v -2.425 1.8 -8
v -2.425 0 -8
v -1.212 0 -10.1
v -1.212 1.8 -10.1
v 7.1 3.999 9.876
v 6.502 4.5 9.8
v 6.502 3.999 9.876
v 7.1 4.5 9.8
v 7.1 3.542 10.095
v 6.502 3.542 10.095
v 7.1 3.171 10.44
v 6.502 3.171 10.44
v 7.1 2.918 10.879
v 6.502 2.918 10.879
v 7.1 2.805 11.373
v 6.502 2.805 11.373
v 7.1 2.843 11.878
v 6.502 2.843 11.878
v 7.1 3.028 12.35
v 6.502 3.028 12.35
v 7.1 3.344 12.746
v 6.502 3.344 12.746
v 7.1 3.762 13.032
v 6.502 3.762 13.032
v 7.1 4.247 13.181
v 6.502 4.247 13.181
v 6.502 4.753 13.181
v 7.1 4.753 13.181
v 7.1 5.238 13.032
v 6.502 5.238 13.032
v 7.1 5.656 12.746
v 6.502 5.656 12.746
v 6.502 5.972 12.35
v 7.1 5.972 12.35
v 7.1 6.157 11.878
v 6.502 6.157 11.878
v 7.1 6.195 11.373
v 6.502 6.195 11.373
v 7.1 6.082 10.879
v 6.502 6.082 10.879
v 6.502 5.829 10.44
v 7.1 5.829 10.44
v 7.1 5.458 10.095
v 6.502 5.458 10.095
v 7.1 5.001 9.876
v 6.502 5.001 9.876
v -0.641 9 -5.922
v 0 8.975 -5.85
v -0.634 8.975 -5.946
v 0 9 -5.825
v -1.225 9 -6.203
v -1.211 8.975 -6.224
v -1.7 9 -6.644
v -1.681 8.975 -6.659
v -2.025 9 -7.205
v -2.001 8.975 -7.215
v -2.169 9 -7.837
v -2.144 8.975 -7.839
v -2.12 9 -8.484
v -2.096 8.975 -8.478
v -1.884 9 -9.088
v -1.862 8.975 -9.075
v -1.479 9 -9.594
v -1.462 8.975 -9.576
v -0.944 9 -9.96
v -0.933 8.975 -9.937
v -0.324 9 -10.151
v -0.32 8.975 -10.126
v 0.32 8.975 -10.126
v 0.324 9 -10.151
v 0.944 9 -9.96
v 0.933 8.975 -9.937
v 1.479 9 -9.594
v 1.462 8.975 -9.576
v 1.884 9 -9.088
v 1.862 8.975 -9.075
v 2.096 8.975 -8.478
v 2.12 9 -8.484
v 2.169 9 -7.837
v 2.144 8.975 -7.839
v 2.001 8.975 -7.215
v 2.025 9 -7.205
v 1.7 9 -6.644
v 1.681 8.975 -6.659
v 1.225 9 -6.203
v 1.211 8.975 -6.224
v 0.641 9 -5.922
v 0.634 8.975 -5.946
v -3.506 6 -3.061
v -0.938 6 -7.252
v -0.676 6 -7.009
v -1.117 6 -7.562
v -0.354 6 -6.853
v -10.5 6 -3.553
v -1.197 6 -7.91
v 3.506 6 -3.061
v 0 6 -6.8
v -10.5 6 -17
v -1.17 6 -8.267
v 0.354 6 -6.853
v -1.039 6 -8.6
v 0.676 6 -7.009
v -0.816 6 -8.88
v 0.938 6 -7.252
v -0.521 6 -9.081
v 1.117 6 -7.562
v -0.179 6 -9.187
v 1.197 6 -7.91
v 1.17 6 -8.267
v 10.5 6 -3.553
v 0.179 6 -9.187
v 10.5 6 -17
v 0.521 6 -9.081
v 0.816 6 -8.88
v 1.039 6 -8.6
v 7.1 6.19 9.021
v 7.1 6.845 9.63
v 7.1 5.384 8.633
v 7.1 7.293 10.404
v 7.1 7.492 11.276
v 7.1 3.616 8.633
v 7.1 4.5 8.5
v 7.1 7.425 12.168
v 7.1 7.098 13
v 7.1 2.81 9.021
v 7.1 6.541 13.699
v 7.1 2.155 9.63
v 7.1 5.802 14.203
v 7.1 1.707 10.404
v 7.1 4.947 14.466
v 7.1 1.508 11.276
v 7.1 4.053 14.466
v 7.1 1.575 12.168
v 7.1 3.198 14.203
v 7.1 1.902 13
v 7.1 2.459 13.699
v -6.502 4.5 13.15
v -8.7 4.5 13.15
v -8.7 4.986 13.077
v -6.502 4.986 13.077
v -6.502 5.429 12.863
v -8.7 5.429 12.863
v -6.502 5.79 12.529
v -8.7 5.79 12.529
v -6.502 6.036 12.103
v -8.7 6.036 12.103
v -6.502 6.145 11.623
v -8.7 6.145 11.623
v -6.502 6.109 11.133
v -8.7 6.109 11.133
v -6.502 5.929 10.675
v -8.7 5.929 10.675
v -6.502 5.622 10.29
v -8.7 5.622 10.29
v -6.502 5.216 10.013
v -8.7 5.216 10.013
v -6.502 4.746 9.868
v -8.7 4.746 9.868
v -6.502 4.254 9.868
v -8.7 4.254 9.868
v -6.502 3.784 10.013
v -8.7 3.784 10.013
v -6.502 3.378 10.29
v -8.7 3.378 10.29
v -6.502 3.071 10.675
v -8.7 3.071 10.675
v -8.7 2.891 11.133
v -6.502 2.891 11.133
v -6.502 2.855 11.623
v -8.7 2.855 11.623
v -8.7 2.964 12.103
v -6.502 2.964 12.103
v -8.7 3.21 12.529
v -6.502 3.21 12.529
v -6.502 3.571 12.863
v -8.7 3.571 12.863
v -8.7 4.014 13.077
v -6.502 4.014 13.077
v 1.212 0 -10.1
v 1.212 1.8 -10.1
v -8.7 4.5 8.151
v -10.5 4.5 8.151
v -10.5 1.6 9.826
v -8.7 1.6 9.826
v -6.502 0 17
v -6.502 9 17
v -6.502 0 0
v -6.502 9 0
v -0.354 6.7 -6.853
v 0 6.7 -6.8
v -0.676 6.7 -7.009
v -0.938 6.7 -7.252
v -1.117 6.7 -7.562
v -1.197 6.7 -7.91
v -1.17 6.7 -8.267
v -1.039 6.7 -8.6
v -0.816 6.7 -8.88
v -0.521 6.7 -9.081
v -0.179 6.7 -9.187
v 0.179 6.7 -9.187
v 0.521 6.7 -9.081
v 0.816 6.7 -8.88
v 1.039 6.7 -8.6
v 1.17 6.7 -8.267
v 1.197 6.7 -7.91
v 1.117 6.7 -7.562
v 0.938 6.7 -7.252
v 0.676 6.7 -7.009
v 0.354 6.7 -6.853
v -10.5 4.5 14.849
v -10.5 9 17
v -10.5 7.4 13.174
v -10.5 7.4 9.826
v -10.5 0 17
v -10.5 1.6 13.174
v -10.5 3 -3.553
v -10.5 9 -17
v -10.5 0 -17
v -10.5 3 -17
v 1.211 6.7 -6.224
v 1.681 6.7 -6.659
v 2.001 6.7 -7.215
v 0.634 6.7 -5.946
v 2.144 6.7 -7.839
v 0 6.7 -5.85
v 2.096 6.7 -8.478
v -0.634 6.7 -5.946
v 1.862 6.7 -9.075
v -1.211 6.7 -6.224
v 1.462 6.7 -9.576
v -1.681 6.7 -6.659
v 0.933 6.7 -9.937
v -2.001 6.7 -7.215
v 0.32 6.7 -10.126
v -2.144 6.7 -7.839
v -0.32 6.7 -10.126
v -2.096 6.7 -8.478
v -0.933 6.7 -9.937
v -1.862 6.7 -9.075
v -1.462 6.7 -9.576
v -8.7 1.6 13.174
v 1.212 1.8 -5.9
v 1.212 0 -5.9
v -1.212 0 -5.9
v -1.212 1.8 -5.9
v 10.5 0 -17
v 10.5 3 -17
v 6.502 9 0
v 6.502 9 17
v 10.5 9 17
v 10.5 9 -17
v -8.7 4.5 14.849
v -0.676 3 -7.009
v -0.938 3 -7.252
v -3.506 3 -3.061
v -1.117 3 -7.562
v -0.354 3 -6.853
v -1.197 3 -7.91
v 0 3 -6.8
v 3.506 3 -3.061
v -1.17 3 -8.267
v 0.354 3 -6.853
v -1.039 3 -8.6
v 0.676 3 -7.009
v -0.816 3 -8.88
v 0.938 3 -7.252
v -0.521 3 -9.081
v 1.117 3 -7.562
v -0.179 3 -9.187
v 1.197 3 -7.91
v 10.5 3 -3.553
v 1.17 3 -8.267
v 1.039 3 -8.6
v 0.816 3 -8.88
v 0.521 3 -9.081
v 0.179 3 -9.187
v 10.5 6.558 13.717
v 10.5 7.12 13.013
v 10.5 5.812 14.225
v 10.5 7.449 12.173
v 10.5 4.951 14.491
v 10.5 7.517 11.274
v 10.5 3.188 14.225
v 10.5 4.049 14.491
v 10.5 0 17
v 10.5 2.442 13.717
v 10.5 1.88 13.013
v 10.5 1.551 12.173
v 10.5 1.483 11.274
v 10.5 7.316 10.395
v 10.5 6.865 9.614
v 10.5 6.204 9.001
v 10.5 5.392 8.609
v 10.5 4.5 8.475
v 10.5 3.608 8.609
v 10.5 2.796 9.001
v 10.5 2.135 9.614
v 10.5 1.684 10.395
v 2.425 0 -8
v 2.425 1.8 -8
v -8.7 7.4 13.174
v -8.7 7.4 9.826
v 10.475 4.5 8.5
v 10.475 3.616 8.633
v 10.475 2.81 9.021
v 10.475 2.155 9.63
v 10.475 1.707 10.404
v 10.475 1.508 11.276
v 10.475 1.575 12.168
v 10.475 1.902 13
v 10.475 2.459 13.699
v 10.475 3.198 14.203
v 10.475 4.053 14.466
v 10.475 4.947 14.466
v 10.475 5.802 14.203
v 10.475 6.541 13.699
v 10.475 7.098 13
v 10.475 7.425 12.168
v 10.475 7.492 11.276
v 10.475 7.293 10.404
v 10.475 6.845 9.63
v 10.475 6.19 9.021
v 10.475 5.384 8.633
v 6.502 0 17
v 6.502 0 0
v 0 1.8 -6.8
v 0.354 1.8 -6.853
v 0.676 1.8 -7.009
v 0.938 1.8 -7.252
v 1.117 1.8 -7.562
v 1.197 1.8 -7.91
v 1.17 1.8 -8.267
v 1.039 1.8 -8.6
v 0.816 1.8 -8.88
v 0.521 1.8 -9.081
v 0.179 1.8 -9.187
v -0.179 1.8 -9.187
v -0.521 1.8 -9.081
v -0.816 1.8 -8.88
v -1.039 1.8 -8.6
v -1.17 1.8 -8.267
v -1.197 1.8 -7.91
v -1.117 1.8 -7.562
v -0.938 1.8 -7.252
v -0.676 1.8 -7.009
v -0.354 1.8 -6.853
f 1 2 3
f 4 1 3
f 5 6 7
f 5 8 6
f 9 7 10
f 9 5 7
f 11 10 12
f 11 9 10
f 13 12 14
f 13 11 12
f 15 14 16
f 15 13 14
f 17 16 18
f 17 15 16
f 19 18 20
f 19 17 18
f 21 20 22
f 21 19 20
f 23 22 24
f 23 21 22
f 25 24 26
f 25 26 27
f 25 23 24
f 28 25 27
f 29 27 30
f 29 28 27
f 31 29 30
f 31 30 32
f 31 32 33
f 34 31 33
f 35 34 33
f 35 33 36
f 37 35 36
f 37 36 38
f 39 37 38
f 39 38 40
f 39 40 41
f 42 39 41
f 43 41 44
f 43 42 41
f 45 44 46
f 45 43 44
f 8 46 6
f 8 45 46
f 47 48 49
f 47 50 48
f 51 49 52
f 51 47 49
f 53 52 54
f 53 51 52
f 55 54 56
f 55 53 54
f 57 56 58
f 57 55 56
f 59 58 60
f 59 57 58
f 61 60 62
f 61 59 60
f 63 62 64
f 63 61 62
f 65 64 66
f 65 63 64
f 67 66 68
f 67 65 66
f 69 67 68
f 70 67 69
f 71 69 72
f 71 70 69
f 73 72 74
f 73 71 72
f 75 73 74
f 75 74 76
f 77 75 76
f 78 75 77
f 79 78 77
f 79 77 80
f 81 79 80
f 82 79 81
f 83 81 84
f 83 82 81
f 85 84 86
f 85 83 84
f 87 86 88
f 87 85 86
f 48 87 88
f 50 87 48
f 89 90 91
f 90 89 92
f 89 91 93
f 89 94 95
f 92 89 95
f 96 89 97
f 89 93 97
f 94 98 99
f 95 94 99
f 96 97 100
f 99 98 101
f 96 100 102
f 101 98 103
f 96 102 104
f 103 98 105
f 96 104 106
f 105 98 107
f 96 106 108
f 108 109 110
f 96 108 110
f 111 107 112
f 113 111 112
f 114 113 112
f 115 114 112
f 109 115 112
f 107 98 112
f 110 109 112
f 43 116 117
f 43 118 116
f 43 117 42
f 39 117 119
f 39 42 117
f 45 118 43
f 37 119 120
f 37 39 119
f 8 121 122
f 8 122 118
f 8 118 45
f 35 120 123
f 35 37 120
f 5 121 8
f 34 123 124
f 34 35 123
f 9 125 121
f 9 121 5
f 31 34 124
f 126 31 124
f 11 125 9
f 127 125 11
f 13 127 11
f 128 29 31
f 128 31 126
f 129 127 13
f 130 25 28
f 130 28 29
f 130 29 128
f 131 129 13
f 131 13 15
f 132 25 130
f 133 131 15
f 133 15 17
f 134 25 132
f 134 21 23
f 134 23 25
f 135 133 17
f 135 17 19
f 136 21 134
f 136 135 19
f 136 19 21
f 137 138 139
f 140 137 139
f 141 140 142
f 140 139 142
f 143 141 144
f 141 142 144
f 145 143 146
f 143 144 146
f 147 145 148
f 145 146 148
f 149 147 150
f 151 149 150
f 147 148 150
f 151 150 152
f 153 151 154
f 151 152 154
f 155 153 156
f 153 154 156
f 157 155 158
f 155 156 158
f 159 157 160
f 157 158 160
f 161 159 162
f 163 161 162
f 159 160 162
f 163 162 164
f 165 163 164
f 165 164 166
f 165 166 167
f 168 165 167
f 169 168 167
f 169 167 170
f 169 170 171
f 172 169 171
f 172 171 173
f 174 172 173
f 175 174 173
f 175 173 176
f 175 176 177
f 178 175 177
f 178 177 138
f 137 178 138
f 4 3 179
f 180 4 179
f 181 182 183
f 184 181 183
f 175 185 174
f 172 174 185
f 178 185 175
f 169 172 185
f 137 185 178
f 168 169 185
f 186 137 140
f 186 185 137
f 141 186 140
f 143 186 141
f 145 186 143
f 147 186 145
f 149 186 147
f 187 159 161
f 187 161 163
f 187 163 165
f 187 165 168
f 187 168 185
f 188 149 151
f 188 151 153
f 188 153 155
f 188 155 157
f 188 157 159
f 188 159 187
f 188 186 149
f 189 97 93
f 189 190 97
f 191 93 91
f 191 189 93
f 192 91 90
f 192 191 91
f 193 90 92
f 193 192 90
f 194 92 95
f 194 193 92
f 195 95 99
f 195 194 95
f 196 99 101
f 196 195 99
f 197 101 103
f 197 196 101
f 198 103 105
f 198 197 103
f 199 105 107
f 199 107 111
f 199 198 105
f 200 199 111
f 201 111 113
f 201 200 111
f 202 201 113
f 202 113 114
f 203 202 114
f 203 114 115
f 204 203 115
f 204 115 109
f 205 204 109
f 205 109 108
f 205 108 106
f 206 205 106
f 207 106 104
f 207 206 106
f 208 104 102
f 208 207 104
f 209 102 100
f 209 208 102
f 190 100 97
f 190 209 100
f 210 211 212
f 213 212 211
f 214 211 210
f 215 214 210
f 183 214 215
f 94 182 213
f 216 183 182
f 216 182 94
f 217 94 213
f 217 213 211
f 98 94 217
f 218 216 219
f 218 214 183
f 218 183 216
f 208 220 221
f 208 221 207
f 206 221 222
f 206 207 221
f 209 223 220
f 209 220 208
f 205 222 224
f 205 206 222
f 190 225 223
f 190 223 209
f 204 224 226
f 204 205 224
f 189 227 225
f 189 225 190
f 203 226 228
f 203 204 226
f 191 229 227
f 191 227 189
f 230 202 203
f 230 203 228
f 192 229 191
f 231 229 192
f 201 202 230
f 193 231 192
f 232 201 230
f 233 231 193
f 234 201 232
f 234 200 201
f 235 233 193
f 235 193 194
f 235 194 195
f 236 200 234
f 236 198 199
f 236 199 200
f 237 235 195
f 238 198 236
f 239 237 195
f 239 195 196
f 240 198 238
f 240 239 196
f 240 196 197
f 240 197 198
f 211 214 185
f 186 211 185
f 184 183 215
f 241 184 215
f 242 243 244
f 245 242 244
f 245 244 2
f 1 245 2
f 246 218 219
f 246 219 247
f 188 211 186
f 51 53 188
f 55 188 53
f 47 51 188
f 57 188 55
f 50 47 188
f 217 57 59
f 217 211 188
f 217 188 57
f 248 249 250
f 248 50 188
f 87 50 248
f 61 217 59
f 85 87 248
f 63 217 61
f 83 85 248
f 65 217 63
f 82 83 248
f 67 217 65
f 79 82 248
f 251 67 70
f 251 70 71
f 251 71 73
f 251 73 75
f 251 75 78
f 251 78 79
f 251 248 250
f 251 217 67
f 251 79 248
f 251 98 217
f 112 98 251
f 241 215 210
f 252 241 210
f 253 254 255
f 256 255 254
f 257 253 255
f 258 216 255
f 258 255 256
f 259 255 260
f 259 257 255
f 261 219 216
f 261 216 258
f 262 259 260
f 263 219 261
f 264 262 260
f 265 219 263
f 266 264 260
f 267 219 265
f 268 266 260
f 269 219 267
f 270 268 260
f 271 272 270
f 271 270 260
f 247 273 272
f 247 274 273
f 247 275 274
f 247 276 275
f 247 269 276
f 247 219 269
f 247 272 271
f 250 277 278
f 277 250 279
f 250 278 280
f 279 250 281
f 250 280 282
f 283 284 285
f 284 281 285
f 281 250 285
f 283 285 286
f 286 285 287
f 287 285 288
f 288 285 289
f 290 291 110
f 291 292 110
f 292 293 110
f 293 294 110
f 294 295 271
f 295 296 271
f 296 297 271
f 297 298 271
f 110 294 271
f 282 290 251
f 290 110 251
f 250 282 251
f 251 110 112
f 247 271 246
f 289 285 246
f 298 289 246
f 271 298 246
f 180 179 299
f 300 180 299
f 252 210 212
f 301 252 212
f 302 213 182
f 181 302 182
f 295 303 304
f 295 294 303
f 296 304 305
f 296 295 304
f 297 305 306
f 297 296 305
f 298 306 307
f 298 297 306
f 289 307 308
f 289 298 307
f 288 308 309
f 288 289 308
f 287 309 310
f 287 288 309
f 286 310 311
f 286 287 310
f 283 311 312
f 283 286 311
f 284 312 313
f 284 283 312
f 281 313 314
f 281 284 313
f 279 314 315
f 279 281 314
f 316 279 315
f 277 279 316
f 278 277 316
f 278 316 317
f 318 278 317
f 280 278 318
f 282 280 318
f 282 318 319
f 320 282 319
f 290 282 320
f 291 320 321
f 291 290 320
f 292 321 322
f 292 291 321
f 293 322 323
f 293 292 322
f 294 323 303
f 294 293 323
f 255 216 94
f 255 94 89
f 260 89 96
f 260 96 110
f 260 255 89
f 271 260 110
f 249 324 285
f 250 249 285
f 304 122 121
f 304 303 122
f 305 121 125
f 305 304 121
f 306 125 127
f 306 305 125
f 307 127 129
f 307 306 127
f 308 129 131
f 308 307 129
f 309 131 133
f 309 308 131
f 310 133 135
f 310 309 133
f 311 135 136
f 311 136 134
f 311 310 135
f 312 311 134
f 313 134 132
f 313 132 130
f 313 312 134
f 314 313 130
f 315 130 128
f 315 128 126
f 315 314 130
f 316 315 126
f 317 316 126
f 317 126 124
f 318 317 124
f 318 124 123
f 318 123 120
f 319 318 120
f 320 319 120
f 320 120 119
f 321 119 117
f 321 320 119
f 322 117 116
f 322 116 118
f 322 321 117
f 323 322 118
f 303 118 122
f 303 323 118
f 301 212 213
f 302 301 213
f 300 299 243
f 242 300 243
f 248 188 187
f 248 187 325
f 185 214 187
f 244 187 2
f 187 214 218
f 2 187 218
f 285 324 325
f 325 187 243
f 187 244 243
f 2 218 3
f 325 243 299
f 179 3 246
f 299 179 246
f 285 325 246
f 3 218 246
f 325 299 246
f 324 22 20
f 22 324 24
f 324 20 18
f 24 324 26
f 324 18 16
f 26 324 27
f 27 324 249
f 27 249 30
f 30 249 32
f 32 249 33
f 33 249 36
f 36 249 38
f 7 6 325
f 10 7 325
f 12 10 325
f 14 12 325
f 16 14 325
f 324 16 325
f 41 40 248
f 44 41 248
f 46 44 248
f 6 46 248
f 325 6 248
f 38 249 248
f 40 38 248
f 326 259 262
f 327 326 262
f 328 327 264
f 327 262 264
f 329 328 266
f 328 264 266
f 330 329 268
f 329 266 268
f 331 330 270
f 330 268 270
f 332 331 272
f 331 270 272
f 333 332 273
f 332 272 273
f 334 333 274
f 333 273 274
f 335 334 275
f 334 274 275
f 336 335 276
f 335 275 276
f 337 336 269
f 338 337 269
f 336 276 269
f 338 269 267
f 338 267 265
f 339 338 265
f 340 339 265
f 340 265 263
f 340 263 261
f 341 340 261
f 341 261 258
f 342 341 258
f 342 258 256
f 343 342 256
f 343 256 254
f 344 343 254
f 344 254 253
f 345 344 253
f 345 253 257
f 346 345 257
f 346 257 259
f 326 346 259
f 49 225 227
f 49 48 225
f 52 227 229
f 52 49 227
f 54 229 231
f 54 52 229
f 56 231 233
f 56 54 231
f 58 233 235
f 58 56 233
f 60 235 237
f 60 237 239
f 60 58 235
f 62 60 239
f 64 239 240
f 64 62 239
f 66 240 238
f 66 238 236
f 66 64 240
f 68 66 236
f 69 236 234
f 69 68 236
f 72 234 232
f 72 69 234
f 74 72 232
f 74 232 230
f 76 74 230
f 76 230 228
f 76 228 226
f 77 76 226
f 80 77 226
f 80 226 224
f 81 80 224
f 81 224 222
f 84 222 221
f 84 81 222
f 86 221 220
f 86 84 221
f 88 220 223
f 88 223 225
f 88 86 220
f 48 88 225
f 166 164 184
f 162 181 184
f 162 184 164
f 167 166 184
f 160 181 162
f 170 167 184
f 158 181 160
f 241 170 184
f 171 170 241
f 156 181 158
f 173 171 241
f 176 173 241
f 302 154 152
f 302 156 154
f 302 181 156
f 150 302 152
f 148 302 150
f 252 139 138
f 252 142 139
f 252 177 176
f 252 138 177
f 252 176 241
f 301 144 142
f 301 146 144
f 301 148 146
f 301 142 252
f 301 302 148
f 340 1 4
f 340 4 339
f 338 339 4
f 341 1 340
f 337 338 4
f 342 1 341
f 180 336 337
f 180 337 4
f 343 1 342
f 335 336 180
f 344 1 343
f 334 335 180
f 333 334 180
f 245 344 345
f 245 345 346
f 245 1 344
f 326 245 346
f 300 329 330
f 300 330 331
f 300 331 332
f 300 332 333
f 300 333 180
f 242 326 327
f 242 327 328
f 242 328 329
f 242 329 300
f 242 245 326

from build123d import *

# Parameters (mm, degrees)
SKETCH_1_W          = 21
SKETCH_1_H          = 34
EXTRUDE_1_DEPTH     = 9
SKETCH_6_W          = 13.003696042
SKETCH_6_H          = 17
CUT_EXTRUDE_3_DEPTH = 22.914607001
CUT_EXTRUDE_4_DEPTH = 1.8
CUT_EXTRUDE_5_REACH = 29.178
SKETCH_11_R         = 1.65
CUT_EXTRUDE_6_DEPTH = 3
CUT_EXTRUDE_7_REACH = 22.863
SKETCH_16_R         = 1.2
CUT_EXTRUDE_8_DEPTH = 1.8


with BuildPart() as part:
    # 草图1 → 凸台-拉伸1 (new body)
    with BuildSketch(Plane(origin=(0, 0, 0), x_dir=(1, 0, 0), z_dir=(0, 1, 0))):
        Rectangle(SKETCH_1_W, SKETCH_1_H)
    extrude(amount=EXTRUDE_1_DEPTH)

    # 草图6 → 切除-拉伸3 (cut, through all)
    with BuildSketch(Plane(origin=(0, 9, 0), x_dir=(1, 0, 0), z_dir=(0, 1, 0))):
        with Locations((0, -8.5)):
            Rectangle(SKETCH_6_W, SKETCH_6_H)
    extrude(amount=-CUT_EXTRUDE_3_DEPTH, mode=Mode.SUBTRACT)

    # 草图9 → M3 六角圆柱头螺钉的柱形沉头孔1 (revolve, cut)
    with BuildSketch(Plane(origin=(10.5, 4.5, 11.5), x_dir=(0, 0, -1), z_dir=(0, 1, 0))):
        Polygon((0, 0), (0, 3.998151979), (1.7, 3.998151979), (1.7, 3.4), (3, 3.4), (3, 0.025), (3.025, 0), align=None)
    revolve(axis=Axis((16.85, 4.5, 11.5), (-1, 0, 0)), mode=Mode.SUBTRACT)

    # 草图10 → 切除-拉伸4 (cut)
    with BuildSketch(Plane.ZY.offset(10.5)):
        Polygon((13.174315781, 1.6), (14.848631561, 4.5), (13.174315781, 7.4), (9.825684219, 7.4), (8.151368439, 4.5), (9.825684219, 1.6), align=None)
    extrude(amount=-CUT_EXTRUDE_4_DEPTH, mode=Mode.SUBTRACT)

    # 草图11 → 切除-拉伸5 (cut, up to next)
    with BuildSketch(Plane.ZY.offset(8.7), mode=Mode.PRIVATE) as cut_extrude_5_sk1:
        with Locations((11.5, 4.5)):
            Circle(SKETCH_11_R)
    cut_extrude_5_tool1 = extrude(cut_extrude_5_sk1.sketch, amount=-CUT_EXTRUDE_5_REACH, mode=Mode.PRIVATE) & part.part
    add(cut_extrude_5_tool1.solids().sort_by_distance((-8.7, 4.5, 11.5))[0], mode=Mode.SUBTRACT)

    # 草图12 → 切除-拉伸6 (cut)
    with BuildSketch(Plane(origin=(0, 3, 0), x_dir=(-1, 0, 0), z_dir=(0, -1, 0))):
        with BuildLine():
            Line((-10.5, 17), (10.5, 17))
            Line((10.5, 17), (10.5, 3.552777817))
            ThreePointArc((10.5, 3.552777817), (0, 3), (-10.5, 3.552777817))
            Line((-10.5, 3.552777817), (-10.5, 17))
        make_face()
    extrude(amount=-CUT_EXTRUDE_6_DEPTH, mode=Mode.SUBTRACT)

    # 草图15 → M2 六角圆柱头螺钉的柱形沉头孔1 (revolve, cut)
    with BuildSketch(Plane(origin=(0, 9, -8), x_dir=(0, 0, 1), z_dir=(1, 0, 0))):
        Polygon((0, 0), (0, 3), (1.2, 3), (1.2, 2.3), (2.15, 2.3), (2.15, 0.025), (2.175, 0), align=None)
    revolve(axis=Axis((0, 15.35, -8), (0, -1, 0)), mode=Mode.SUBTRACT)

    # 草图16 → 切除-拉伸7 (cut, up to next)
    with BuildSketch(Plane(origin=(0, 3, 0), x_dir=(1, 0, 0), z_dir=(0, 1, 0)), mode=Mode.PRIVATE) as cut_extrude_7_sk1:
        with Locations(Location((0, 8, 0), (0, 0, 270))):
            Circle(SKETCH_16_R)
    cut_extrude_7_tool1 = extrude(cut_extrude_7_sk1.sketch, amount=-CUT_EXTRUDE_7_REACH, mode=Mode.PRIVATE) & part.part
    add(cut_extrude_7_tool1.solids().sort_by_distance((0, 3, -8))[0], mode=Mode.SUBTRACT)

    # 草图17 → 切除-拉伸8 (cut)
    with BuildSketch(Plane.XZ):
        Polygon((1.212435565, -10.1), (2.424871131, -8), (1.212435565, -5.9), (-1.212435565, -5.9), (-2.424871131, -8), (-1.212435565, -10.1), align=None)
    extrude(amount=-CUT_EXTRUDE_8_DEPTH, mode=Mode.SUBTRACT)


solid = part.part
